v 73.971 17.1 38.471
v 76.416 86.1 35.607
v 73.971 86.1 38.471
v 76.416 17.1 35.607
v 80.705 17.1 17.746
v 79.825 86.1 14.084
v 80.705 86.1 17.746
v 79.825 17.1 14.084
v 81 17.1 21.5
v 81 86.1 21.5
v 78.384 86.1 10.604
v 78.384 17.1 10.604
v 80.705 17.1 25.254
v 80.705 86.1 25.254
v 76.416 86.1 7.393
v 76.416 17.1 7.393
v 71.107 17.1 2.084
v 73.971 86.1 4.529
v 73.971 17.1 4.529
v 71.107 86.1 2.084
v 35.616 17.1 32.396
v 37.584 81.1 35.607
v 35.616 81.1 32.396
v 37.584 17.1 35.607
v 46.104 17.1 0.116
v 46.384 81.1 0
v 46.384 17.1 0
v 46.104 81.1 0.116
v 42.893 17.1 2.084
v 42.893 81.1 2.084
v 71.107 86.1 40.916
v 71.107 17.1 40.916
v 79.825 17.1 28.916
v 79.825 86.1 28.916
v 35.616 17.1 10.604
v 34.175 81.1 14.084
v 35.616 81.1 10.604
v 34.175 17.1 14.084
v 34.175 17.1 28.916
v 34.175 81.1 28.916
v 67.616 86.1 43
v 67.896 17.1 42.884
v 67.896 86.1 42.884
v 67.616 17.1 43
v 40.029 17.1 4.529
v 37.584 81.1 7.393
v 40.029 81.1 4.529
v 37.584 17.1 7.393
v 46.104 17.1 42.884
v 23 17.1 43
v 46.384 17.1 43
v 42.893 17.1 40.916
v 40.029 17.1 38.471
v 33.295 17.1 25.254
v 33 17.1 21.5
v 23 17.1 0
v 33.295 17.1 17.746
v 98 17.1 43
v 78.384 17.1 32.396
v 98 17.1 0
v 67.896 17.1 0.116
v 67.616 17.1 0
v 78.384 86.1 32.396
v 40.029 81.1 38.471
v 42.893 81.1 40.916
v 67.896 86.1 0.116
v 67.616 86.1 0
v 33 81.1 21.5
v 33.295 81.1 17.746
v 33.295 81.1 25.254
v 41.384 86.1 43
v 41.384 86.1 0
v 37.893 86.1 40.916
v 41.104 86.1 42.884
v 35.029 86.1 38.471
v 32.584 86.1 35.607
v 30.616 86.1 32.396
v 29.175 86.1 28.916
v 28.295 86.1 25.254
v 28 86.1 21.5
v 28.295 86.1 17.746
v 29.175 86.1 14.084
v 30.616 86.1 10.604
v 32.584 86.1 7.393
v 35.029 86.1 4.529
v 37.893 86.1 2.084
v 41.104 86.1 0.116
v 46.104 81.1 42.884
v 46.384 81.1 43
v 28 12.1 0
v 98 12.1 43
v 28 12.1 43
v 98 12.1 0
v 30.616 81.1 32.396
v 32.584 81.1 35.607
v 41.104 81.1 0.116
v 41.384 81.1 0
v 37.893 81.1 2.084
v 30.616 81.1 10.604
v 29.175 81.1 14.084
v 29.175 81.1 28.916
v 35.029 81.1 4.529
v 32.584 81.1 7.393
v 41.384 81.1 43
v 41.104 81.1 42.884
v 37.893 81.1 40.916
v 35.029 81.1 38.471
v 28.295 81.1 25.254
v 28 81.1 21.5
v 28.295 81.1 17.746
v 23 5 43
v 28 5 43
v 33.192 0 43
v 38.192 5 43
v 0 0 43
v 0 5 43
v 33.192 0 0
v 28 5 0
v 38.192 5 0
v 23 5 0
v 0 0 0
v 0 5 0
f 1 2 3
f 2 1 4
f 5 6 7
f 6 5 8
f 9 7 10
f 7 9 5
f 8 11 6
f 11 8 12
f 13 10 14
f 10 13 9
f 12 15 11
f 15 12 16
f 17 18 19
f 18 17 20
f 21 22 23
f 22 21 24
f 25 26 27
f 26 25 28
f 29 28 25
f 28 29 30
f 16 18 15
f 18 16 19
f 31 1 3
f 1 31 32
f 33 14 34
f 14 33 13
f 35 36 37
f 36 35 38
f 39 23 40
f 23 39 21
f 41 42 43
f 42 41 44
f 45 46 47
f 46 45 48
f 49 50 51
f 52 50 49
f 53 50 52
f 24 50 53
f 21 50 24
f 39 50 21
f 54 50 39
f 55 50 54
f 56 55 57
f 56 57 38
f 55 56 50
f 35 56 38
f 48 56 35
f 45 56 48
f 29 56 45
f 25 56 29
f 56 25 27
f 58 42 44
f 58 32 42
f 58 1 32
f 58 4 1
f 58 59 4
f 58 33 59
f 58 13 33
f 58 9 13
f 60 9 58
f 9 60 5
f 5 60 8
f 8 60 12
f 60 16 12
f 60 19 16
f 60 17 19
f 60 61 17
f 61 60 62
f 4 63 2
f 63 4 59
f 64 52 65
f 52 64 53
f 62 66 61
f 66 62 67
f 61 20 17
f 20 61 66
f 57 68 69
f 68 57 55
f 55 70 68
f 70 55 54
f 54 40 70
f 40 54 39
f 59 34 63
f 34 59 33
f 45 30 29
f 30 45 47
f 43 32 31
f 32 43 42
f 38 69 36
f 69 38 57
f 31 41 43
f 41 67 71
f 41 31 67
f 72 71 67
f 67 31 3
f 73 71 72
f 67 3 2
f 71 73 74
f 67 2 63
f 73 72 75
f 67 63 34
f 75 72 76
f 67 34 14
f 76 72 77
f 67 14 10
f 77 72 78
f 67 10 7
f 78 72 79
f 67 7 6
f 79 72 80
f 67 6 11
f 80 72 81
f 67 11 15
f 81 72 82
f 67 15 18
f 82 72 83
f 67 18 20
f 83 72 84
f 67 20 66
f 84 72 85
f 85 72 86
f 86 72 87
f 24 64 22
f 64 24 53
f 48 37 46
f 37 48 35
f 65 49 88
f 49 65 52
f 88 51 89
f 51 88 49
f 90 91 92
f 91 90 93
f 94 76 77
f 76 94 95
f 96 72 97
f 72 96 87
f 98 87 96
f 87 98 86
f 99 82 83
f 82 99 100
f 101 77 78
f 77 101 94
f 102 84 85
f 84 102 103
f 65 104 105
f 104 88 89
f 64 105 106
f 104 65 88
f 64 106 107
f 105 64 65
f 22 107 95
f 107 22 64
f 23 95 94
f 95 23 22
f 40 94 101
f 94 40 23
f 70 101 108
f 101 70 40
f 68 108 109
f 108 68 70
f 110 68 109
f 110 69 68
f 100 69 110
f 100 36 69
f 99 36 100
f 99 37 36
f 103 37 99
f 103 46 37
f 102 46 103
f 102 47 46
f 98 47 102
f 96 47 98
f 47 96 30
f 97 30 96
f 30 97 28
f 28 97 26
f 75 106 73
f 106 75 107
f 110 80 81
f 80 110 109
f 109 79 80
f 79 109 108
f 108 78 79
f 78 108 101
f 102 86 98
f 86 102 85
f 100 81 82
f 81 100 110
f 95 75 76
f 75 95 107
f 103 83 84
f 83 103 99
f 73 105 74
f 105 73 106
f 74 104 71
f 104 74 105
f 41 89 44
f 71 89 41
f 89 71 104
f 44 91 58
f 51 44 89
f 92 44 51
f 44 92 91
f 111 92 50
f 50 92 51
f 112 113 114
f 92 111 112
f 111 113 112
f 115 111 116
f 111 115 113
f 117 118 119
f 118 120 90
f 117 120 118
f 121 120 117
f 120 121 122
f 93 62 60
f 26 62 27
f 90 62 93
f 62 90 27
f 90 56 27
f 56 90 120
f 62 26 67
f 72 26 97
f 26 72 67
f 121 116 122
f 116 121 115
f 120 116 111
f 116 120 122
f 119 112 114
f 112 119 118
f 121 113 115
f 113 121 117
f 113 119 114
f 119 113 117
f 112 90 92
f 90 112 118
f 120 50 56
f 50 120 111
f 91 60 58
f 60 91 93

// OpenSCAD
// Parametric spool holder for MBI R2 by Woale modified by TheFisherOne

// preview[view:north west, tilt:top diagonal]

/* [General] */
// an allowance that has to be made because the plastic is likely to expand to larger than is desired, usually a small positive number of mm. ALL Dimensions are in mm, multiply inches by 25.4 to get mm.
expansion_allowance=0; // [0:0.1:2]

/* [Size of Hole and Lip that it has to fit into] */
// the width of the hole it has to fit into (note it will be built smaller than this)
measured_lip_width=51; // [23:1:75]
// the depth of the lip that it will be hanging on to
measured_lip_depth=7.1; // [5:0.1:25]
// how high the space is above the lip
measured_lip_height=16; // [5:0.1:40]

/* [ measurements of the spool that needs to hang on it] */
//the spool that wants to hang on it
// the diameter of the hole in the spool
measured_spool_hole_diameter = 53; // [23:0.5:75]
// how long the hole is (not the overall width of the spool, but the part that will sit on the holder)
measured_inside_spool_width=64; //[23:0.5:100]
// offset of the edge of the spool compared to the edge of the hole, note that this is on the inside facing the wall
measured_spool_offset_on_inside=0; //[0:0.1:25]
 
/* [Hidden] */
//corrections to allow for expansion
lip_max_width=measured_lip_width-expansion_allowance;
lip_height=measured_lip_height-expansion_allowance;
spool_hole_diameter=measured_spool_hole_diameter-expansion_allowance;
inside_spool_width=measured_inside_spool_width+expansion_allowance;
spool_offset=measured_spool_offset_on_inside+expansion_allowance;
lip_depth=measured_lip_depth+expansion_allowance;

//fixed
thickness=5;
plate_top_length=23;
spindle_plate_length=75;
spindle_lip_height=5;


//formulas
//need space to put one lip and the shaft through the hole
final_diameter=spool_hole_diameter-spindle_lip_height;
// narrow the width so that the spindle will have a flat side and it is easier to print without supports
lip_width=((final_diameter-thickness) < lip_max_width)? final_diameter-thickness:lip_max_width;

//fix
$fn=40;

//plate holder
module plt_hld()
{
	//box1 with the end cut at 45 degrees
    // the length is the length of the part that sticks above the bar plus the side of a triangle whose hypotonuse is the lip_height and the other side is approximated by a 45 triangle of size lip_depth
    temp_plate_len=plate_top_length+sqrt((lip_height*lip_height)-(lip_depth/sqrt(2))*lip_depth/sqrt(2));
    difference(){
	  cube([temp_plate_len,thickness,lip_width]);
        // cut off the end at a 45 degree angle, make it just a little longer in every dimension to make the cut clean
      translate([temp_plate_len,thickness,-1])
         rotate([0,0,225])
            cube([thickness*2, thickness*2, lip_width+2]);
    }
	//box2
	translate([plate_top_length,thickness,0]) 
        cube([thickness,lip_depth,lip_width]);
	//box3
	translate([plate_top_length,thickness+lip_depth,0]) 
        cube([spindle_plate_length,thickness,lip_width]);
}



//spool holder
module spl_hld()
{
    //the main holder
    y_offset_of_cylinder=2*thickness+lip_depth;
    x_offset_of_cylinder=plate_top_length+thickness+spindle_lip_height+final_diameter/2;
    translate([x_offset_of_cylinder,y_offset_of_cylinder , lip_width/2])
      rotate([-90,0,0])
      cylinder(h=inside_spool_width+spool_offset+thickness, 
             d=final_diameter);
    // the inside lip
    translate([x_offset_of_cylinder-spindle_lip_height, y_offset_of_cylinder+spool_offset-thickness, lip_width/2])
      rotate([-90,0,0])
      cylinder(h=spindle_lip_height, 
             d=final_diameter);
    // the outside lip
    translate([x_offset_of_cylinder-spindle_lip_height, y_offset_of_cylinder+spool_offset+inside_spool_width, lip_width/2])
      rotate([-90,0,0])
      cylinder(h=spindle_lip_height, 
             d=final_diameter);

}
intersection(){
union(){
    spl_hld();
    plt_hld();
}
cube([plate_top_length+spindle_plate_length, 3*thickness+lip_depth+inside_spool_width+spool_offset, lip_width]);
}
